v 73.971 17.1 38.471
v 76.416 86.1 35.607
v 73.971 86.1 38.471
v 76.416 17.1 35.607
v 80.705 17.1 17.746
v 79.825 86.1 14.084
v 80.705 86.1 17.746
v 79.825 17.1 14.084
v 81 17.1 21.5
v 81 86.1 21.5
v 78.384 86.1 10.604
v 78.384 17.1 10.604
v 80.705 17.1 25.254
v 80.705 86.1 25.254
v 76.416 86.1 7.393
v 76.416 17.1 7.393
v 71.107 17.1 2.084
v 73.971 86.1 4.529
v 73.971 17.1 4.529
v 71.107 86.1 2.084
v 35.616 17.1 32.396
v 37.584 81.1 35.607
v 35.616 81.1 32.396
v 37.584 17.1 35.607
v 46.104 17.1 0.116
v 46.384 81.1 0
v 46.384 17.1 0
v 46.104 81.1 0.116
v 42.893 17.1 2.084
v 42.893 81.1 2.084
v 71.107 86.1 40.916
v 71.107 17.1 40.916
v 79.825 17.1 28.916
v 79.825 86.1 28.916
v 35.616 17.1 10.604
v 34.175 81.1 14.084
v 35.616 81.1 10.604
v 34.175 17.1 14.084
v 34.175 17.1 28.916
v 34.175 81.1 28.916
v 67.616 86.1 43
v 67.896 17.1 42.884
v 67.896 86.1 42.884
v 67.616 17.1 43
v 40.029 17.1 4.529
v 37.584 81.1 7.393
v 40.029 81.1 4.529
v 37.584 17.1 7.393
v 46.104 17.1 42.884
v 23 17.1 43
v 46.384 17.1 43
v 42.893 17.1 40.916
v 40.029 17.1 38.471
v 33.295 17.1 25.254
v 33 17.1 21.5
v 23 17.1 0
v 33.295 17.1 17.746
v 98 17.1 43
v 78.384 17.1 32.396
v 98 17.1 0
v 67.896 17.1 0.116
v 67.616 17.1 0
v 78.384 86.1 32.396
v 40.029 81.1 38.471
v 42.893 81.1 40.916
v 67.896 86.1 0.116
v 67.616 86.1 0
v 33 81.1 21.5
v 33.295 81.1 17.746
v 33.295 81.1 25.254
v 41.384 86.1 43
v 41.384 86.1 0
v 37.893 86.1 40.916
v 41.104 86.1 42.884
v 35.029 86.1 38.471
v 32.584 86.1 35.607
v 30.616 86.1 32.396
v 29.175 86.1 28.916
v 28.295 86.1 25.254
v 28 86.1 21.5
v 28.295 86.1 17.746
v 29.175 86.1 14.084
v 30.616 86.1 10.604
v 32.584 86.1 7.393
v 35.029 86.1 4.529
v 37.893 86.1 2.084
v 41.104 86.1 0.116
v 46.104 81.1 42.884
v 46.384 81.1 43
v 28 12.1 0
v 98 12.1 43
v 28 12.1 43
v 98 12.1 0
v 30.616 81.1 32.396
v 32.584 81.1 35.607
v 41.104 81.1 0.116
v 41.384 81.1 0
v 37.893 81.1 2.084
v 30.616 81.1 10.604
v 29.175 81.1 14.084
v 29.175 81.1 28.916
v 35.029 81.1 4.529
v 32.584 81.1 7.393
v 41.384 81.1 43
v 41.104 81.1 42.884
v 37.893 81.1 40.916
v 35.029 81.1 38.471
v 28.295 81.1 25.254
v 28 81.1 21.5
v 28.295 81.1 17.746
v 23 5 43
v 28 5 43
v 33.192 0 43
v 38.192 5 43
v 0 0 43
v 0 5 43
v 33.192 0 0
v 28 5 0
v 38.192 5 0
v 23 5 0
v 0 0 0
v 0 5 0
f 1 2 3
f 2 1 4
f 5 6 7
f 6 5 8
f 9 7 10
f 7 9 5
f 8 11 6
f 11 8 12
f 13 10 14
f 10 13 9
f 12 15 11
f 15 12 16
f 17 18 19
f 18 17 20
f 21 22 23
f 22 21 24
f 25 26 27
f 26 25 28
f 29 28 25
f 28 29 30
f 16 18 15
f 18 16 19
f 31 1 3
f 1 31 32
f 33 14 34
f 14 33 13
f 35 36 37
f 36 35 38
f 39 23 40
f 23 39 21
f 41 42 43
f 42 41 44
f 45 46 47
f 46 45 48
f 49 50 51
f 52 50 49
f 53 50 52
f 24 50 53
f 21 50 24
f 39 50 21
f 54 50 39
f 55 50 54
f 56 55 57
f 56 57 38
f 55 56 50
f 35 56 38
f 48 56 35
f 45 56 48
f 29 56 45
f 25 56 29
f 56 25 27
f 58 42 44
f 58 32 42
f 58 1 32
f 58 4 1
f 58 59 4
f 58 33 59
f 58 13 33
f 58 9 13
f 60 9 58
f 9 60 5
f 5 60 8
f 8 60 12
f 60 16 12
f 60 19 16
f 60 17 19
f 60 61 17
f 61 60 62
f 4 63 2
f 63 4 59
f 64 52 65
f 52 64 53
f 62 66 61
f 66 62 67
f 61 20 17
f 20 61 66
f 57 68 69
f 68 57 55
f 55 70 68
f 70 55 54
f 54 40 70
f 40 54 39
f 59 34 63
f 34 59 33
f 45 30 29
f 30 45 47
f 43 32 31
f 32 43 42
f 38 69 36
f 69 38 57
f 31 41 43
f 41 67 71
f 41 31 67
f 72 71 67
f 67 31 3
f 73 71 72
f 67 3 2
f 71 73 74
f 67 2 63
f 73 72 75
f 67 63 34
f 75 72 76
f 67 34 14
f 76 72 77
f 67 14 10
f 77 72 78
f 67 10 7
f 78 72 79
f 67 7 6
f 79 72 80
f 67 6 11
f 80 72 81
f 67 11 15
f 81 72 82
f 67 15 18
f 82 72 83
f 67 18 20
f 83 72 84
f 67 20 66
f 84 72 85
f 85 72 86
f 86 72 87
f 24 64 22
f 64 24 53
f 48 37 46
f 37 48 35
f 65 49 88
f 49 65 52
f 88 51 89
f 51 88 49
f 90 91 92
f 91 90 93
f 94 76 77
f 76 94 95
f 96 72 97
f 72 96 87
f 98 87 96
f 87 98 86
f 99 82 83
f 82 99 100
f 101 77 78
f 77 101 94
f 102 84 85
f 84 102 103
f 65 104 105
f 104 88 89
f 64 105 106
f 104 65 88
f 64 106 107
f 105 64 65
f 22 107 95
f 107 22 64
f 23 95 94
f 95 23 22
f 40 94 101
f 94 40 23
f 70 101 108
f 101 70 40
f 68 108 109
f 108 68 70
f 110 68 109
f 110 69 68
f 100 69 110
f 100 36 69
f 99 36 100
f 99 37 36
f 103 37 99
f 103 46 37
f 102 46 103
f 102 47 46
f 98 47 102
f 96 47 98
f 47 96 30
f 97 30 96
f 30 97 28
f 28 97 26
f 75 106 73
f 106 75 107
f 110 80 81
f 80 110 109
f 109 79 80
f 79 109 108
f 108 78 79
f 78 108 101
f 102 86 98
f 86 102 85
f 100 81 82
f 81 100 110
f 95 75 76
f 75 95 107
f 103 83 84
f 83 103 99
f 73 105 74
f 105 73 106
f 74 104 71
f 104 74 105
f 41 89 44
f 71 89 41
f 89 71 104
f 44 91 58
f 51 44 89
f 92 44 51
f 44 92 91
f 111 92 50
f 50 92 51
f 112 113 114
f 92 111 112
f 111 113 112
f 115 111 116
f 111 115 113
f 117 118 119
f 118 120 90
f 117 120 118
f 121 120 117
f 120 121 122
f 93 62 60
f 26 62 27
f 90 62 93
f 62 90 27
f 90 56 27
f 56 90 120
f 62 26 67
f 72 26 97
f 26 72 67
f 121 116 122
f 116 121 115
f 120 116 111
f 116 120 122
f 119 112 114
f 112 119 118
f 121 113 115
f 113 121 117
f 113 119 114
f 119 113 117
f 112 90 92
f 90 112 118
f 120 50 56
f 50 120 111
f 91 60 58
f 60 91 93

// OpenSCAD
// Parametric spool holder for MBI R2 by Woale modified by TheFisherOne

// preview[view:north west, tilt:top diagonal]

/* [General] */
// an allowance that has to be made because the plastic is likely to expand to larger than is desired, usually a small positive number of mm. ALL Dimensions are in mm, multiply inches by 25.4 to get mm.
expansion_allowance=0; // [0:0.1:2]

/* [Size of Hole and Lip that it has to fit into] */
// the width of the hole it has to fit into (note it will be built smaller than this)
measured_lip_width=51; // [23:1:75]
// the depth of the lip that it will be hanging on to
measured_lip_depth=7.1; // [5:0.1:25]
// how high the space is above the lip
measured_lip_height=16; // [5:0.1:40]

/* [ measurements of the spool that needs to hang on it] */
//the spool that wants to hang on it
// the diameter of the hole in the spool
measured_spool_hole_diameter = 53; // [23:0.5:75]
// how long the hole is (not the overall width of the spool, but the part that will sit on the holder)
measured_inside_spool_width=64; //[23:0.5:100]
// offset of the edge of the spool compared to the edge of the hole, note that this is on the inside facing the wall
measured_spool_offset_on_inside=0; //[0:0.1:25]
 
/* [Hidden] */
//corrections to allow for expansion
lip_max_width=measured_lip_width-expansion_allowance;
lip_height=measured_lip_height-expansion_allowance;
spool_hole_diameter=measured_spool_hole_diameter-expansion_allowance;
inside_spool_width=measured_inside_spool_width+expansion_allowance;
spool_offset=measured_spool_offset_on_inside+expansion_allowance;
lip_depth=measured_lip_depth+expansion_allowance;

//fixed
thickness=5;
plate_top_length=23;
spindle_plate_length=75;
spindle_lip_height=5;


//formulas
//need space to put one lip and the shaft through the hole
final_diameter=spool_hole_diameter-spindle_lip_height;
// narrow the width so that the spindle will have a flat side and it is easier to print without supports
lip_width=((final_diameter-thickness) < lip_max_width)? final_diameter-thickness:lip_max_width;

//fix
$fn=40;

//plate holder
module plt_hld()
{
	//box1 with the end cut at 45 degrees
    // the length is the length of the part that sticks above the bar plus the side of a triangle whose hypotonuse is the lip_height and the other side is approximated by a 45 triangle of size lip_depth
    temp_plate_len=plate_top_length+sqrt((lip_height*lip_height)-(lip_depth/sqrt(2))*lip_depth/sqrt(2));
    difference(){
	  cube([temp_plate_len,thickness,lip_width]);
        // cut off the end at a 45 degree angle, make it just a little longer in every dimension to make the cut clean
      translate([temp_plate_len,thickness,-1])
         rotate([0,0,225])
            cube([thickness*2, thickness*2, lip_width+2]);
    }
	//box2
	translate([plate_top_length,thickness,0]) 
        cube([thickness,lip_depth,lip_width]);
	//box3
	translate([plate_top_length,thickness+lip_depth,0]) 
        cube([spindle_plate_length,thickness,lip_width]);
}



//spool holder
module spl_hld()
{
    //the main holder
    y_offset_of_cylinder=2*thickness+lip_depth;
    x_offset_of_cylinder=plate_top_length+thickness+spindle_lip_height+final_diameter/2;
    translate([x_offset_of_cylinder,y_offset_of_cylinder , lip_width/2])
      rotate([-90,0,0])
      cylinder(h=inside_spool_width+spool_offset+thickness, 
             d=final_diameter);
    // the inside lip
    translate([x_offset_of_cylinder-spindle_lip_height, y_offset_of_cylinder+spool_offset-thickness, lip_width/2])
      rotate([-90,0,0])
      cylinder(h=spindle_lip_height, 
             d=final_diameter);
    // the outside lip
    translate([x_offset_of_cylinder-spindle_lip_height, y_offset_of_cylinder+spool_offset+inside_spool_width, lip_width/2])
      rotate([-90,0,0])
      cylinder(h=spindle_lip_height, 
             d=final_diameter);

}
intersection(){
union(){
    spl_hld();
    plt_hld();
}
cube([plate_top_length+spindle_plate_length, 3*thickness+lip_depth+inside_spool_width+spool_offset, lip_width]);
}
